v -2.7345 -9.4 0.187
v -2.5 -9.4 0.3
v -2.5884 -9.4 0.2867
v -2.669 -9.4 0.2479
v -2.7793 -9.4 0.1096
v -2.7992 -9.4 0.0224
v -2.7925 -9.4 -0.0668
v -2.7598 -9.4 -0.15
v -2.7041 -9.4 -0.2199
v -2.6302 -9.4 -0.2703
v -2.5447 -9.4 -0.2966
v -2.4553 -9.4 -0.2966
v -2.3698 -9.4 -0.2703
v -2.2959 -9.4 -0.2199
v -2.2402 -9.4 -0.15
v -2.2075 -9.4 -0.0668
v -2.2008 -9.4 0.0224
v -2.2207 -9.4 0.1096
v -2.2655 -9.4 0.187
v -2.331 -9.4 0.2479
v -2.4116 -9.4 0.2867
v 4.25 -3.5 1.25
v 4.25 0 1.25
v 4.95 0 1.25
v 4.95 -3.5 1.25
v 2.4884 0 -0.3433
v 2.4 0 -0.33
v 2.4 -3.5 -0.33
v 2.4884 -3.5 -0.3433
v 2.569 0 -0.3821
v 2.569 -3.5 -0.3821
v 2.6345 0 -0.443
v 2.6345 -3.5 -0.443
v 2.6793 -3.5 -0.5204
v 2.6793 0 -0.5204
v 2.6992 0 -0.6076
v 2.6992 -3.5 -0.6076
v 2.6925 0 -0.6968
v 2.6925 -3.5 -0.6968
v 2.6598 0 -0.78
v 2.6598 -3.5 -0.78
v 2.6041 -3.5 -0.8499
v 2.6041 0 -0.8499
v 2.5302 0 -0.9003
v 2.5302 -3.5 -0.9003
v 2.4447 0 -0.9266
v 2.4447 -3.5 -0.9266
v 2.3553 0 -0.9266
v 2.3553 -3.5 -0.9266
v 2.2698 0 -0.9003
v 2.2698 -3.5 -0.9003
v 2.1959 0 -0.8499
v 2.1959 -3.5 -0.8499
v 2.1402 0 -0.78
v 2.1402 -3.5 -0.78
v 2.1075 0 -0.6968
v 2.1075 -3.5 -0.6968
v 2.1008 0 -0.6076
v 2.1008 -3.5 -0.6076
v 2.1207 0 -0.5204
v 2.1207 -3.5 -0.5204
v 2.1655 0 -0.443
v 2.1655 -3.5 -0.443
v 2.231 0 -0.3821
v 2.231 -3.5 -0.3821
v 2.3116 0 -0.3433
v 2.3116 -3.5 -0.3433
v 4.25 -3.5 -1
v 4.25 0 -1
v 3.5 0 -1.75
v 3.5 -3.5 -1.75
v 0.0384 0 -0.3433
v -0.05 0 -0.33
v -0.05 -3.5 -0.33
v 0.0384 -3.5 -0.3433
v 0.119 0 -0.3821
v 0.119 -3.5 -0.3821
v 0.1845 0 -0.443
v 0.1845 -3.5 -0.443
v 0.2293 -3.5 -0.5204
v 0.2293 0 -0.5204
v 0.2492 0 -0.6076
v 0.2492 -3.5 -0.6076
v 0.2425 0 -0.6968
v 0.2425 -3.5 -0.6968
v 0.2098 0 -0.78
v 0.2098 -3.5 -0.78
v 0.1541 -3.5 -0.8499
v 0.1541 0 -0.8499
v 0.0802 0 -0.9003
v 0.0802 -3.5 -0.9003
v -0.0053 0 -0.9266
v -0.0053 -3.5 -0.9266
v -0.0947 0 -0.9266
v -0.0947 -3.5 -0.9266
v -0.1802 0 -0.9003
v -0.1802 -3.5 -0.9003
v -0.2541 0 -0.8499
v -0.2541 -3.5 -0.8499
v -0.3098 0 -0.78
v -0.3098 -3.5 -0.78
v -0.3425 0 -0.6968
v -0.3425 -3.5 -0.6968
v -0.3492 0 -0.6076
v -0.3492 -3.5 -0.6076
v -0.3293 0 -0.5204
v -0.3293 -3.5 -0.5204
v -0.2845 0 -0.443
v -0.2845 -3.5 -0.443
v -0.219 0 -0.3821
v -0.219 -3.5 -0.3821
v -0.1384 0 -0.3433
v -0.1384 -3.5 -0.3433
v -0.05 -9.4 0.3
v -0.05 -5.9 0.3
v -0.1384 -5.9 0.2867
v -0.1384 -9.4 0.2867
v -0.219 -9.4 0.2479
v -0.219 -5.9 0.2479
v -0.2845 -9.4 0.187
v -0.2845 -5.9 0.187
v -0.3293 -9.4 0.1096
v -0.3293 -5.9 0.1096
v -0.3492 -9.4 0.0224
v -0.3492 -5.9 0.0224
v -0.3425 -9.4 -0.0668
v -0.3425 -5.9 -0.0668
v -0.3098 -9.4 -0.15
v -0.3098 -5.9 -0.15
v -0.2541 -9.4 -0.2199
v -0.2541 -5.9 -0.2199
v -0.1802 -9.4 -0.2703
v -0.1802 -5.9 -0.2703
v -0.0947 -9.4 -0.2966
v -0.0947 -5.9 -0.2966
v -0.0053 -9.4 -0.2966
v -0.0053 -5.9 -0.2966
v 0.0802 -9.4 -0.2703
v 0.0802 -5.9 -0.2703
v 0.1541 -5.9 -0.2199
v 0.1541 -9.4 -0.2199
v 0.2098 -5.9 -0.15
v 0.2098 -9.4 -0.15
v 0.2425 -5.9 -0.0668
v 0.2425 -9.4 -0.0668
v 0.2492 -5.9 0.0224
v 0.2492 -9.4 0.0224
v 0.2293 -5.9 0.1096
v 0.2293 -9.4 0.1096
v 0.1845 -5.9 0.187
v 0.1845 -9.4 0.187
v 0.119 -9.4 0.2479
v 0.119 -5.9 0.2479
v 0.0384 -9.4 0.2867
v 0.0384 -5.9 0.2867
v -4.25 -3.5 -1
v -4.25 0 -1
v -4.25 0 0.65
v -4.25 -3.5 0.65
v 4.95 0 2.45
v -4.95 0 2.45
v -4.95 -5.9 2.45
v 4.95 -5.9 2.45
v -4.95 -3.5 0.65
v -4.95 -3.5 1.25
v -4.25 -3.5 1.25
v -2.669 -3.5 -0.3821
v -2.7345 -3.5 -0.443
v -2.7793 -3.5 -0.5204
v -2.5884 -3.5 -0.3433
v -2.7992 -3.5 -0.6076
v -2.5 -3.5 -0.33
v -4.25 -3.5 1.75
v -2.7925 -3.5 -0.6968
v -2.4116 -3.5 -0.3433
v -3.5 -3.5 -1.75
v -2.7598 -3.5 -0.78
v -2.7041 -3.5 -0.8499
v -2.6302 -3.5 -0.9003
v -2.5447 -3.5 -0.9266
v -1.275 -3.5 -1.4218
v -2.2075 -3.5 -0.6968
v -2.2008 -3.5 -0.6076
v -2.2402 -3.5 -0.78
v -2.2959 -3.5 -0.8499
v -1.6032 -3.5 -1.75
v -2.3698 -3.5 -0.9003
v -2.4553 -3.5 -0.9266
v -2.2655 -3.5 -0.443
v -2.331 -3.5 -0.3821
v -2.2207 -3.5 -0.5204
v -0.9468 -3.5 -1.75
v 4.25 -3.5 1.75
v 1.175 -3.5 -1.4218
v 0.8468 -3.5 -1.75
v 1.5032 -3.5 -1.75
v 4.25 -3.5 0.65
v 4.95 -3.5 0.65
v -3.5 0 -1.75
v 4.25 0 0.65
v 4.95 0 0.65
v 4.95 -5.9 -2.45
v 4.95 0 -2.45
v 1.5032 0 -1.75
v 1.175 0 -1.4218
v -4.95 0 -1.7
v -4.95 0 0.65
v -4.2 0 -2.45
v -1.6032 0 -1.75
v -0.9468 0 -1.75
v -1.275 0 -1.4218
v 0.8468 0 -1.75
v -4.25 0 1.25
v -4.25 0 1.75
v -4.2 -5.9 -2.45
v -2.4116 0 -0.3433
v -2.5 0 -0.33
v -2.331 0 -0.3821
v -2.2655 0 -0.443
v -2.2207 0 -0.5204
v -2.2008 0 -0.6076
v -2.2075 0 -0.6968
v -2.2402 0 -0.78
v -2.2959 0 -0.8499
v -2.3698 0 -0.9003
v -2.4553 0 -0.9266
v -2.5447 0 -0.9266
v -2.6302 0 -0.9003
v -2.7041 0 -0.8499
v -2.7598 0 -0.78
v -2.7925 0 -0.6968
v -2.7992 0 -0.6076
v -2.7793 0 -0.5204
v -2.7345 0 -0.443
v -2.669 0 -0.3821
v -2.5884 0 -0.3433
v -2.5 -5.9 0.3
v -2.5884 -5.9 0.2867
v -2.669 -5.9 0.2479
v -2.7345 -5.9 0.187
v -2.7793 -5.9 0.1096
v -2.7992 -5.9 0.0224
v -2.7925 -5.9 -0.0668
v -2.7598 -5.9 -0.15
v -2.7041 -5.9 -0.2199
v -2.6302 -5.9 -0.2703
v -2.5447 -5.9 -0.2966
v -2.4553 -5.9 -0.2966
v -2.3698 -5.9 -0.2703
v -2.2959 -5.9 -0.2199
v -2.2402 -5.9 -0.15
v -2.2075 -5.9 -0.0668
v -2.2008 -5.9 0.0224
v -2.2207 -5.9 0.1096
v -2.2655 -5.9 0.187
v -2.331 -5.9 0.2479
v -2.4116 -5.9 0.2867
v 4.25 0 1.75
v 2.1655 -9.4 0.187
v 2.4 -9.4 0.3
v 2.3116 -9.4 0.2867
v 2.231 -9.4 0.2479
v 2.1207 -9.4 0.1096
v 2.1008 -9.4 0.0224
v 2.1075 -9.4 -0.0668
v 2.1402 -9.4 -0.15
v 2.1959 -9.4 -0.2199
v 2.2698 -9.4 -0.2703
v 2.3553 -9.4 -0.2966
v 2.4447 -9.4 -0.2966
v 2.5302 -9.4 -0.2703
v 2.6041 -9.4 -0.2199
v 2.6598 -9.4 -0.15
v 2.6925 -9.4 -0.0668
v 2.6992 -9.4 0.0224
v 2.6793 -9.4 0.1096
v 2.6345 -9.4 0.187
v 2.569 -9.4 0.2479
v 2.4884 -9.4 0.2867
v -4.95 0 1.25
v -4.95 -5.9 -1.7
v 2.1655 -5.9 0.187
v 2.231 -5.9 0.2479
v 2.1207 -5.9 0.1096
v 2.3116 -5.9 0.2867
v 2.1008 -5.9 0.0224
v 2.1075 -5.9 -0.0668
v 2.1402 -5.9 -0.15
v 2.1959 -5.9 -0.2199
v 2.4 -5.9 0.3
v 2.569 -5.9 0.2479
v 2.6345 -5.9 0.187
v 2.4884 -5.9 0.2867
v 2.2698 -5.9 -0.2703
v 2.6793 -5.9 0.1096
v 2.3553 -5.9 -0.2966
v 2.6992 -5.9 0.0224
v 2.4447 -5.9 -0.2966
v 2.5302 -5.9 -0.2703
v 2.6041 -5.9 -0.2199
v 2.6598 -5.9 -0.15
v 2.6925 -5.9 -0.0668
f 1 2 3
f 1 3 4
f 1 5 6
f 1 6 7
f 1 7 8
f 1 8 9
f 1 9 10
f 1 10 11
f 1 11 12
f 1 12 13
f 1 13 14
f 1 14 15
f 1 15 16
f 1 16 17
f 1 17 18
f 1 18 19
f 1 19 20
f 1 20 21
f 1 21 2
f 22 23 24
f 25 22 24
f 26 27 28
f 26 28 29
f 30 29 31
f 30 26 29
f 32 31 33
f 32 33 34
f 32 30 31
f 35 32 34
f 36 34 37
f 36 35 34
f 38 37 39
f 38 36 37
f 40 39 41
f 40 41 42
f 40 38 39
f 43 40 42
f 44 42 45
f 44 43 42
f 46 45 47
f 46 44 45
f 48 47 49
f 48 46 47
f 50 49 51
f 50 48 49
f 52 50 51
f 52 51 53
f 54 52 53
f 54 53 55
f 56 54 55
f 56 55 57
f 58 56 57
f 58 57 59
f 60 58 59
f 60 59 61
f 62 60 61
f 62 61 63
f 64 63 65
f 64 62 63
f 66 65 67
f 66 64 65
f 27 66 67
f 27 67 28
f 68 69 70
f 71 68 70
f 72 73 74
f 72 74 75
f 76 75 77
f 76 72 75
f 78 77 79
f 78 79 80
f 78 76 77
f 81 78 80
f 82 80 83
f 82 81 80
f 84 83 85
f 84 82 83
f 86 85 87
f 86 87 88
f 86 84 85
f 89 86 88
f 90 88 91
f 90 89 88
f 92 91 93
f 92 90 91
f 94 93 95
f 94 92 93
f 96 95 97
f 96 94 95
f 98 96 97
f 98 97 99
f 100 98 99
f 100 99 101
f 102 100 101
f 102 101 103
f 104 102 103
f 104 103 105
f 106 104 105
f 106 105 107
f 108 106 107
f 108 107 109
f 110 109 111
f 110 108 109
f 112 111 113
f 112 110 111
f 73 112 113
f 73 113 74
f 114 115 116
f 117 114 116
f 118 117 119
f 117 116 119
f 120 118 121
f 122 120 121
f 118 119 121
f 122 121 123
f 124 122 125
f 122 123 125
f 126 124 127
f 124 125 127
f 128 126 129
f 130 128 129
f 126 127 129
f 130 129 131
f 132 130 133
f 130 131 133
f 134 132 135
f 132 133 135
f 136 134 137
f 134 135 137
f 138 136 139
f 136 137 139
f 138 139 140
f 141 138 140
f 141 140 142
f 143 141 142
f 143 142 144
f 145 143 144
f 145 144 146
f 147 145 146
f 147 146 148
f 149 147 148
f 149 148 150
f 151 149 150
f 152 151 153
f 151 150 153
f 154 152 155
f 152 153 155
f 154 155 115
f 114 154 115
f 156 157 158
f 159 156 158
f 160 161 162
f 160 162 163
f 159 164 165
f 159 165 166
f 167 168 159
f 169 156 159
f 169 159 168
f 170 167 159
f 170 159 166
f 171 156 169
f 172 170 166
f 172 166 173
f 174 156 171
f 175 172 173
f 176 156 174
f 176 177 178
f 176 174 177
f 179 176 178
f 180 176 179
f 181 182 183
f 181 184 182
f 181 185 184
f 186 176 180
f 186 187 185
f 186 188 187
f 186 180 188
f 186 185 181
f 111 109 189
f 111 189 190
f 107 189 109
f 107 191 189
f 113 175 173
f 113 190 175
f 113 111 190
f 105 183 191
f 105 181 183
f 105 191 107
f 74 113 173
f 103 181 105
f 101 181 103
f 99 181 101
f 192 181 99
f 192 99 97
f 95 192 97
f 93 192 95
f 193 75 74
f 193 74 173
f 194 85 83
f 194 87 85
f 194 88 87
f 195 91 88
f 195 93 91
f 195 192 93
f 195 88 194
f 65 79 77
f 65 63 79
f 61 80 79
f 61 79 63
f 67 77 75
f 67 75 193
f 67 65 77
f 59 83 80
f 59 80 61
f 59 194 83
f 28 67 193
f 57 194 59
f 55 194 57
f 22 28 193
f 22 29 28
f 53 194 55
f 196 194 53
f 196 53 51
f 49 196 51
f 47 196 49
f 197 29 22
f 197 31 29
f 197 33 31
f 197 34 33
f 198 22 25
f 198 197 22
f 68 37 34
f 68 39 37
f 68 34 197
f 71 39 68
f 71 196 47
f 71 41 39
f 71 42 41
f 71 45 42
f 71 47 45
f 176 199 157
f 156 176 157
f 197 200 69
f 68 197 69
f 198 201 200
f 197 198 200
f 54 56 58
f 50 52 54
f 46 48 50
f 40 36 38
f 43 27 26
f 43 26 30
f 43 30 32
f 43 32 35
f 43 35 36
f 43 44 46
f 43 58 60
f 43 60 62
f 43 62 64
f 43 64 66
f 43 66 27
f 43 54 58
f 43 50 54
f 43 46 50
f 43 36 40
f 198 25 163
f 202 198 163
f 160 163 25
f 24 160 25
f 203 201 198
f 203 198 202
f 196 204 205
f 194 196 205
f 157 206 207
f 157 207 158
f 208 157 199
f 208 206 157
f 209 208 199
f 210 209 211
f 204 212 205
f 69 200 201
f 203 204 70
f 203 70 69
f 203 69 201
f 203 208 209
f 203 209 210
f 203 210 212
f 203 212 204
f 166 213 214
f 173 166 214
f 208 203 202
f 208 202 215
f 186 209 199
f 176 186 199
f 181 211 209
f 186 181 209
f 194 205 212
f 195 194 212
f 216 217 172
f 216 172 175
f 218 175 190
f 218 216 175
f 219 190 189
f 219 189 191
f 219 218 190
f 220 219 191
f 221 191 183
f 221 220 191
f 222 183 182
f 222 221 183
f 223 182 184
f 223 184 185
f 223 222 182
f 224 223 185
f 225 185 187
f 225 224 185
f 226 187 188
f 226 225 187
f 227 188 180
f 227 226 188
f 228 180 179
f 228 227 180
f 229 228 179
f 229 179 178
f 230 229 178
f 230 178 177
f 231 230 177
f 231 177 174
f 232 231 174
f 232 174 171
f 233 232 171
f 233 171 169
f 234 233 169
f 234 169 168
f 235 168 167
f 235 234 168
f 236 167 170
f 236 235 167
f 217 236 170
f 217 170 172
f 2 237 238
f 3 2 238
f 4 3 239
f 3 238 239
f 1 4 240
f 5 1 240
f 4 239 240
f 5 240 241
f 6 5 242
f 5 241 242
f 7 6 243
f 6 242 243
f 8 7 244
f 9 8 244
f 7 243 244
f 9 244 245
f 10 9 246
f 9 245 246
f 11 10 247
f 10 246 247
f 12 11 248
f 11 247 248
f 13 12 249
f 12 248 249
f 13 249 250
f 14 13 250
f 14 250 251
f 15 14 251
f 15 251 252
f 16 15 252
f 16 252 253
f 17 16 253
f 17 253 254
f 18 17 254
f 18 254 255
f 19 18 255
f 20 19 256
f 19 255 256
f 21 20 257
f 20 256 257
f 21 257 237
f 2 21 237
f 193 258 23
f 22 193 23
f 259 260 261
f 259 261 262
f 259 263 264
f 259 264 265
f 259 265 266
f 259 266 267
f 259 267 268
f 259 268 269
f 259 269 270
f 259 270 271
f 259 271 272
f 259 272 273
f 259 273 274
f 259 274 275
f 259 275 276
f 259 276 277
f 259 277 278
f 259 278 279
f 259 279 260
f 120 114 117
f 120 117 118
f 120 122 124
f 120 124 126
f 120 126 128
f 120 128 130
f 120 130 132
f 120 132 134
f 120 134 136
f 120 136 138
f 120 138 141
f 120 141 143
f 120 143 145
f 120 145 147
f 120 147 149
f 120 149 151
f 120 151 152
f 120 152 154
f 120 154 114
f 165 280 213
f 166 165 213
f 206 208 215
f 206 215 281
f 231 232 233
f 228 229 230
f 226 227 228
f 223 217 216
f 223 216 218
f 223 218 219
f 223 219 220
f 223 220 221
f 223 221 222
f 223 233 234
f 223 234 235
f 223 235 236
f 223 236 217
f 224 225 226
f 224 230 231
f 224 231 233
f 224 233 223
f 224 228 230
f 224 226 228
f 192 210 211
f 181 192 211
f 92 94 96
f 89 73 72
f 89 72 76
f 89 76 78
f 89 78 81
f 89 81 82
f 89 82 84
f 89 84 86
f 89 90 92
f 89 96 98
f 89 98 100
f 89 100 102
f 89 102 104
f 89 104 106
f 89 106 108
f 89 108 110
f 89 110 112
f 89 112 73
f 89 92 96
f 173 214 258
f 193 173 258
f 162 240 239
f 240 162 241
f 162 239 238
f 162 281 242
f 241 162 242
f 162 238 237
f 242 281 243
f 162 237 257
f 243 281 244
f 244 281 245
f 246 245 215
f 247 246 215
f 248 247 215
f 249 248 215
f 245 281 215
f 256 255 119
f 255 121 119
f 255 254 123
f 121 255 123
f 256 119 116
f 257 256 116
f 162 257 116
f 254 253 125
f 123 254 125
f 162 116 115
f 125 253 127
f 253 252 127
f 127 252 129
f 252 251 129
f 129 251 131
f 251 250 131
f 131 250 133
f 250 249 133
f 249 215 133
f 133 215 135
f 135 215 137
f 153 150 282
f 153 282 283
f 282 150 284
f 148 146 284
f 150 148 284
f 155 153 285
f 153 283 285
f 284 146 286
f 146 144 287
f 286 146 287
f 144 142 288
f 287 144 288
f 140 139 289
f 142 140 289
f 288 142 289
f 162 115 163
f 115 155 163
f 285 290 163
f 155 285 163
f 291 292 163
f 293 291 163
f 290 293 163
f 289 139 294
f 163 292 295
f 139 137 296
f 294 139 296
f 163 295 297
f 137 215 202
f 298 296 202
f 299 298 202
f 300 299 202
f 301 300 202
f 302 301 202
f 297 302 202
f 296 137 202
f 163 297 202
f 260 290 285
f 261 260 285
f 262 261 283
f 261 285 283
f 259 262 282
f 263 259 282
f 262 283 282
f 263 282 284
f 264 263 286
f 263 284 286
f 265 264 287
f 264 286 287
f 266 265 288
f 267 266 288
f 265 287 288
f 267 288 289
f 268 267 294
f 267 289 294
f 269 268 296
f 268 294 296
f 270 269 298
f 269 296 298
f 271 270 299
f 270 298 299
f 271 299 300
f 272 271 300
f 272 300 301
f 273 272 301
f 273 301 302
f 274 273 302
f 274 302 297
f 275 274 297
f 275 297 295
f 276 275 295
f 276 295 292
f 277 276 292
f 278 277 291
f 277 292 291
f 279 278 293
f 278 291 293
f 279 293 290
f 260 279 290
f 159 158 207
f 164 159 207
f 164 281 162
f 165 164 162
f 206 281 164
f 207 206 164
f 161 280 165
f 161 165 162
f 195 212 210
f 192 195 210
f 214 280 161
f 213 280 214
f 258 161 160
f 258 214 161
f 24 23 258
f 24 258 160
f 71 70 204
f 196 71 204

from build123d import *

# Parameters (mm, degrees)
BOSS_EXTRUDE1_DEPTH = 5.9
SKETCH2_R           = 0.3
BOSS_EXTRUDE2_DEPTH = 3.5
SKETCH3_R           = 0.3
CUT_EXTRUDE1_DEPTH  = 3.5


with BuildPart() as part:
    # Sketch1 → Boss-Extrude1 (new body)
    with BuildSketch(Plane(origin=(0, 0, 0), x_dir=(1, 0, 0), z_dir=(0, 1, 0))):
        Polygon((-4.2, 2.45), (-4.95, 1.7), (-4.95, -2.45), (4.95, -2.45), (4.95, 2.45), align=None)
    extrude(amount=-BOSS_EXTRUDE1_DEPTH)

    # Sketch2 → Boss-Extrude2 (add)
    with BuildSketch(Plane.XZ.offset(5.9)):
        with Locations((-2.5, 0)):
            Circle(SKETCH2_R)
        with Locations((-0.05, 0)):
            Circle(SKETCH2_R)
        with Locations((2.4, 0)):
            Circle(SKETCH2_R)
    extrude(amount=BOSS_EXTRUDE2_DEPTH)

    # Sketch3 → Cut-Extrude1 (cut)
    with BuildSketch(Plane(origin=(0, 0, 0), x_dir=(1, 0, 0), z_dir=(0, 1, 0))):
        Polygon((-1.603247496, 1.75), (-3.5, 1.75), (-4.25, 1), (-4.25, -0.65), (-4.95, -0.65), (-4.95, -1.25), (-4.25, -1.25), (-4.25, -1.75), (4.25, -1.75), (4.25, -1.25), (4.95, -1.25), (4.95, -0.65), (4.25, -0.65), (4.25, 1), (3.5, 1.75), (1.503247496, 1.75), (1.175, 1.421752504), (0.846752504, 1.75), (-0.946752504, 1.75), (-1.275, 1.421752504), align=None)
        with Locations((-2.5, 0.63)):
            Circle(SKETCH3_R, mode=Mode.SUBTRACT)
        with Locations((-0.05, 0.63)):
            Circle(SKETCH3_R, mode=Mode.SUBTRACT)
        with Locations((2.4, 0.63)):
            Circle(SKETCH3_R, mode=Mode.SUBTRACT)
    extrude(amount=-CUT_EXTRUDE1_DEPTH, mode=Mode.SUBTRACT)


solid = part.part
